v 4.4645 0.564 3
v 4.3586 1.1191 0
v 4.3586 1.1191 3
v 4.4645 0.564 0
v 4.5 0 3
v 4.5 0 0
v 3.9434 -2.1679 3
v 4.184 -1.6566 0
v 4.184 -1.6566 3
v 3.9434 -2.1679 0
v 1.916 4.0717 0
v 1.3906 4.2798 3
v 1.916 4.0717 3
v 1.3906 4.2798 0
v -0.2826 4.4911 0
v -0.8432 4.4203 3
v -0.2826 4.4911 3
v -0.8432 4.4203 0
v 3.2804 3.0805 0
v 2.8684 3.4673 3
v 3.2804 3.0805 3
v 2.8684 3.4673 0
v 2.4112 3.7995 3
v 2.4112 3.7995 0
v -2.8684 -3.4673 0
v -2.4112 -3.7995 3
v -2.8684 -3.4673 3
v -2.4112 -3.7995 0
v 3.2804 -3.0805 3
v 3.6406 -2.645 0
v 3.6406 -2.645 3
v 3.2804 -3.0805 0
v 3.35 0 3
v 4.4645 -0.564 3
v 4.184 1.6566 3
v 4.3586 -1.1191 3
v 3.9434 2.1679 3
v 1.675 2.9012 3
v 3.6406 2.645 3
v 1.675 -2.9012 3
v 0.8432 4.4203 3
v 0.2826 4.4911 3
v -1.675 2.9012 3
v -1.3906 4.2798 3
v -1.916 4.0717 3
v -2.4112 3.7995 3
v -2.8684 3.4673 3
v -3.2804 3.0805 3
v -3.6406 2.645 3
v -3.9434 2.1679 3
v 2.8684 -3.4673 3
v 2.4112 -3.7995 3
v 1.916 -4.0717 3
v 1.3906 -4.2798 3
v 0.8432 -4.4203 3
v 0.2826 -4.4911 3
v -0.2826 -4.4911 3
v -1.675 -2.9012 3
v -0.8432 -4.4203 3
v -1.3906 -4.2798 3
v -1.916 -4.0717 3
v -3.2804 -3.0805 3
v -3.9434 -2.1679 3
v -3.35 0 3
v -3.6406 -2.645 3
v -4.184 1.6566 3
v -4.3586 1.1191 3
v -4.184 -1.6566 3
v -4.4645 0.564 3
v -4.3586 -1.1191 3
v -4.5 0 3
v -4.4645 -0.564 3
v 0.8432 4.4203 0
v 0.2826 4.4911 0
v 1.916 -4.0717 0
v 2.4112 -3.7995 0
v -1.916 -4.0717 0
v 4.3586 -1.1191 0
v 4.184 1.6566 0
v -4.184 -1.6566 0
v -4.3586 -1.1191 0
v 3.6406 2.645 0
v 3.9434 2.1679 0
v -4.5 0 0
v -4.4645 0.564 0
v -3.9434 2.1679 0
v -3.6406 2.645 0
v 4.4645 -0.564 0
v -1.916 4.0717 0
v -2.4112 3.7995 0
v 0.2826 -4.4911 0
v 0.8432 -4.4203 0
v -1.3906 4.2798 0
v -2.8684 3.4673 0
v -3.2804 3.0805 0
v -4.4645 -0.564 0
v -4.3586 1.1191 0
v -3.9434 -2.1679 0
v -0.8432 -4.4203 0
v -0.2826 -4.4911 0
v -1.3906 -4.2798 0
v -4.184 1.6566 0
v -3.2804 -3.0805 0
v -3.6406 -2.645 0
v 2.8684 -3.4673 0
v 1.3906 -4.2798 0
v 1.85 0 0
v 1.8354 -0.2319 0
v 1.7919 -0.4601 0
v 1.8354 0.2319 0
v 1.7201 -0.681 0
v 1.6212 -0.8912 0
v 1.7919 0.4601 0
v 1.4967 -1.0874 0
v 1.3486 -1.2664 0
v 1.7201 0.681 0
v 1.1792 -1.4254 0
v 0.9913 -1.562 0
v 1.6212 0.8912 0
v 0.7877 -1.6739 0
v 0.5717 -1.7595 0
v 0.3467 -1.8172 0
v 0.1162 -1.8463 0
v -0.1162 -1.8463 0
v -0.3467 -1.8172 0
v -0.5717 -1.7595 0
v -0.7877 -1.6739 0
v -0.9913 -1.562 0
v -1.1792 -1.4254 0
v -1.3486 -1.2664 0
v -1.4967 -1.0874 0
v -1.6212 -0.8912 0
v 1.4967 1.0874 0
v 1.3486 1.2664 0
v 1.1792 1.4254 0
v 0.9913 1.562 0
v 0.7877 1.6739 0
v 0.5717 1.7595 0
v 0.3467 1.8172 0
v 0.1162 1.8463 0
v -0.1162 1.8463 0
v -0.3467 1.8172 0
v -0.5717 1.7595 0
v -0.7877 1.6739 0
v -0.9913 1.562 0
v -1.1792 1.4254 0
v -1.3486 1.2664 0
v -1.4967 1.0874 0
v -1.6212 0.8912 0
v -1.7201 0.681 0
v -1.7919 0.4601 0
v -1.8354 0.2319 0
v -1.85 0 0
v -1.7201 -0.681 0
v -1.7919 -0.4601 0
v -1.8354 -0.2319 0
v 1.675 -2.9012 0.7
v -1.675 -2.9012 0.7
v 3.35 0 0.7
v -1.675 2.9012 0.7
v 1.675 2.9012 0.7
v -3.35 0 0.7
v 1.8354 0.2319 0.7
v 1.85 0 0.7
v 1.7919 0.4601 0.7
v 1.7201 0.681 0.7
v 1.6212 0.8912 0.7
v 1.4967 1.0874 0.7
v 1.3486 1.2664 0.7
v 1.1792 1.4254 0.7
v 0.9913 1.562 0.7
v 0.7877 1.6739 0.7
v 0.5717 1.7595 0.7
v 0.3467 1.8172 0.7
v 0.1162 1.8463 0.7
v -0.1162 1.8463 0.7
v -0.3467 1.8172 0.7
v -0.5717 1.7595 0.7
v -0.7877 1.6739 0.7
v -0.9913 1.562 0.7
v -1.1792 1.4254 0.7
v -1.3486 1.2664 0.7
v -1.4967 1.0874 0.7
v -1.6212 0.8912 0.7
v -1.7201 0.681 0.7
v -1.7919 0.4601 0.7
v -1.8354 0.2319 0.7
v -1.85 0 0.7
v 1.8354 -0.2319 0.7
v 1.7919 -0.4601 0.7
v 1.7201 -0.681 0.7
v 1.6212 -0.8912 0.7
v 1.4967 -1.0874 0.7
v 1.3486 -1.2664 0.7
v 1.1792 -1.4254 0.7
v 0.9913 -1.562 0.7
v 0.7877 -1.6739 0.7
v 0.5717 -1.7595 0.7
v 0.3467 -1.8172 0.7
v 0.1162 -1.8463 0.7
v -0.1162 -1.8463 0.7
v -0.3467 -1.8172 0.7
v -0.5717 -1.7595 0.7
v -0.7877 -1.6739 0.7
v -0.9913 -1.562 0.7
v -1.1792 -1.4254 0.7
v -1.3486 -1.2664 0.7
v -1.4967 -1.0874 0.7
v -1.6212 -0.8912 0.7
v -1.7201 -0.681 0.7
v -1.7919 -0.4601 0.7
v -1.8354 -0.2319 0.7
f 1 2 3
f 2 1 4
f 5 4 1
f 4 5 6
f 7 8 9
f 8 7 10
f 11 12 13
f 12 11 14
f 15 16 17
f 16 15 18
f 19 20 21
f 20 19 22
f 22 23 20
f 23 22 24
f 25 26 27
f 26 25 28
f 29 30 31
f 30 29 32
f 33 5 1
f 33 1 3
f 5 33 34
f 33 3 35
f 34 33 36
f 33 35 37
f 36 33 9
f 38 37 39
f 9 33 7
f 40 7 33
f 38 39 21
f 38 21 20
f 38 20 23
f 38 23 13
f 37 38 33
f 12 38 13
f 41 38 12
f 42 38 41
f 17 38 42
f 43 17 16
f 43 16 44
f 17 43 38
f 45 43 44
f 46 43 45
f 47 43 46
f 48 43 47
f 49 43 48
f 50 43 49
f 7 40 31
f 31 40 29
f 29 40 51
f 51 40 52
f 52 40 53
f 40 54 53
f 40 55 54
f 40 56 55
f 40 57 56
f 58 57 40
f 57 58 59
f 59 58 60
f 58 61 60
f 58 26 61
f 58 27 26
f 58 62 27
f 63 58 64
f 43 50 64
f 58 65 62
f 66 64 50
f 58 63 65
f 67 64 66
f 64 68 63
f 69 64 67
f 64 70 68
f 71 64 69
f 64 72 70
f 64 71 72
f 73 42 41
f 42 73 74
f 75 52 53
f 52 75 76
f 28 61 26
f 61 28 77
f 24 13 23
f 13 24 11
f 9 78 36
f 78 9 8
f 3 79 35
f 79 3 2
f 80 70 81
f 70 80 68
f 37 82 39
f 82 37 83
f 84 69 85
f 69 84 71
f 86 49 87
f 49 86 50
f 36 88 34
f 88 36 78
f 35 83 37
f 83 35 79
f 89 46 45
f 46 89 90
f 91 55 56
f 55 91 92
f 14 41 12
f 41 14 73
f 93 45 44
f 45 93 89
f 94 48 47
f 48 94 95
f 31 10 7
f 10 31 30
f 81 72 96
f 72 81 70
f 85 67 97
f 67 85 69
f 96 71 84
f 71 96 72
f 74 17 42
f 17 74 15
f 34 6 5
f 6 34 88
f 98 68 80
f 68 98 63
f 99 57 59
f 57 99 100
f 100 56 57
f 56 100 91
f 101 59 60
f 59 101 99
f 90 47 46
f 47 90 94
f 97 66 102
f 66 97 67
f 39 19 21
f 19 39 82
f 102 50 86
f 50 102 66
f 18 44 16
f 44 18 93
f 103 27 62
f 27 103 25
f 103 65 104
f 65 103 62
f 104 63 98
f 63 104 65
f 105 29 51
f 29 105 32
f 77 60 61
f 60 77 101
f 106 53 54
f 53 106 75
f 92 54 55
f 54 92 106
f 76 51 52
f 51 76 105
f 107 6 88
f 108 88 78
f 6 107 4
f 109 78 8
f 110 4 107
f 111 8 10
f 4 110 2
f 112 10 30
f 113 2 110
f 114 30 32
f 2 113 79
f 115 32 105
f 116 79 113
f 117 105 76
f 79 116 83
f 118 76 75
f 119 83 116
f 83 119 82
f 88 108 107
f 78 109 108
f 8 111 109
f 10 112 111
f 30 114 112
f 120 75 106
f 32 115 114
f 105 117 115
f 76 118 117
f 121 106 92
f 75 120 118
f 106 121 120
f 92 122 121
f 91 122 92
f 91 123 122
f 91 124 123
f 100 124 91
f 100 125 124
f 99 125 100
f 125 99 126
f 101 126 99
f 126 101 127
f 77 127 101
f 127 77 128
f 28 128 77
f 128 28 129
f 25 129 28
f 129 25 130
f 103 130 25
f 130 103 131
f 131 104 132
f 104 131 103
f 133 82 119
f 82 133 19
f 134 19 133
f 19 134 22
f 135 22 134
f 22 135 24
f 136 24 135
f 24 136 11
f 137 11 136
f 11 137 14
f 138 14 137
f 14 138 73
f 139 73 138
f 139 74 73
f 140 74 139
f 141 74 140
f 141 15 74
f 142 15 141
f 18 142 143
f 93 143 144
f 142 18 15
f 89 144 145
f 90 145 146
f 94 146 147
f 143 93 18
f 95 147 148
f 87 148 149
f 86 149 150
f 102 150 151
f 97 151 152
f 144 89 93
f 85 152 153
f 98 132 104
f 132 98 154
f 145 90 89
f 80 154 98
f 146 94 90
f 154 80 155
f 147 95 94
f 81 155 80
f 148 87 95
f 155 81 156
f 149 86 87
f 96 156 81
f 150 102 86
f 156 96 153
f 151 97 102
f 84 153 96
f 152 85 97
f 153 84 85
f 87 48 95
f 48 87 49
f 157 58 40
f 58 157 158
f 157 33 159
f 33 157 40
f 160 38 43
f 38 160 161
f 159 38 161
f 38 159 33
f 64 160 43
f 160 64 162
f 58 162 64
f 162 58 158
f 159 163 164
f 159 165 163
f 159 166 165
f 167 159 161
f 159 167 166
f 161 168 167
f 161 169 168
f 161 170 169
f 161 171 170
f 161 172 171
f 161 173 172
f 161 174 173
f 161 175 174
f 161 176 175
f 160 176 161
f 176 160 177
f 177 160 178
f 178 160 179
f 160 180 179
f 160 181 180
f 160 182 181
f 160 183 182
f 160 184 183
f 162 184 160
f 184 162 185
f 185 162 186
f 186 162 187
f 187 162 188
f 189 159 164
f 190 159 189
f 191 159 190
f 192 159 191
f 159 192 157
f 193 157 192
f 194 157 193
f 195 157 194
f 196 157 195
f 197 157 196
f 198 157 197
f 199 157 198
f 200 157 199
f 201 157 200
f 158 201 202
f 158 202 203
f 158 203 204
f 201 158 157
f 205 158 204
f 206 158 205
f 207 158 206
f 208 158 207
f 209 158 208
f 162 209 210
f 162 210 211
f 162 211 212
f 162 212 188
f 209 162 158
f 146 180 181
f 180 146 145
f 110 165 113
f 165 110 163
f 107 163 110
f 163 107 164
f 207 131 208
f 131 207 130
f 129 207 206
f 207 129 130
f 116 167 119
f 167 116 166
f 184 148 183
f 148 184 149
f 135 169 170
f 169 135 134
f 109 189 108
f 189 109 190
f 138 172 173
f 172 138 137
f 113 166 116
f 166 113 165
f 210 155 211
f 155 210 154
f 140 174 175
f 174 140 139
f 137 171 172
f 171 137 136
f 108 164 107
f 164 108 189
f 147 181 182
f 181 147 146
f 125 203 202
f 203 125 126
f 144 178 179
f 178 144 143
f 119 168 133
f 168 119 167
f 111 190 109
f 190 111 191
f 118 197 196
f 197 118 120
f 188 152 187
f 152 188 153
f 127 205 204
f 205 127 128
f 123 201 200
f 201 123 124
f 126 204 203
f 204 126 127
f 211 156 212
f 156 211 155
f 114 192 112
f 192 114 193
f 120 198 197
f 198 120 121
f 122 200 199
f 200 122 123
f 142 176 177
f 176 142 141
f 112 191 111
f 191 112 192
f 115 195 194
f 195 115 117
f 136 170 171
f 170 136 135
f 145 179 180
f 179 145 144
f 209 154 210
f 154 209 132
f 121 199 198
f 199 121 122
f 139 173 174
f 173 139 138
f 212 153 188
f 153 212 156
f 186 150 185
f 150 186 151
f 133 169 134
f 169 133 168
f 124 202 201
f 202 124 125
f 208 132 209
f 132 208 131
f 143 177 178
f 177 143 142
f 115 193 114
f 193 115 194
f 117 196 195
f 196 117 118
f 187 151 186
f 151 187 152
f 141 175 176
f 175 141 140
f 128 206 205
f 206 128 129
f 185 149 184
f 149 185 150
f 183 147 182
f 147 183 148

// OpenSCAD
margen_error=0.7;

//Tuercas M3
radio_tuercas_M3=3+(margen_error/2);
alto_tuerca_M3=2.3;
alto_hexagono_tuerca_ciega_M3=3;
radio_tornillo_M3=1.5+(margen_error/2);


//Tuerca, tuerca ciega y tornillo M3
module tuerca_M3(){
    cylinder(r=radio_tuercas_M3, h=alto_tuerca_M3, $fn=6);
}


module tornillo_M3(){
    cylinder(r=radio_tornillo_M3, h=25, $fn=50);
}

difference(){
    cylinder(r=4.5, h=3, $fn=50);
    translate([0, 0, 3-alto_tuerca_M3])
        tuerca_M3();
    tornillo_M3();
}
    
    
